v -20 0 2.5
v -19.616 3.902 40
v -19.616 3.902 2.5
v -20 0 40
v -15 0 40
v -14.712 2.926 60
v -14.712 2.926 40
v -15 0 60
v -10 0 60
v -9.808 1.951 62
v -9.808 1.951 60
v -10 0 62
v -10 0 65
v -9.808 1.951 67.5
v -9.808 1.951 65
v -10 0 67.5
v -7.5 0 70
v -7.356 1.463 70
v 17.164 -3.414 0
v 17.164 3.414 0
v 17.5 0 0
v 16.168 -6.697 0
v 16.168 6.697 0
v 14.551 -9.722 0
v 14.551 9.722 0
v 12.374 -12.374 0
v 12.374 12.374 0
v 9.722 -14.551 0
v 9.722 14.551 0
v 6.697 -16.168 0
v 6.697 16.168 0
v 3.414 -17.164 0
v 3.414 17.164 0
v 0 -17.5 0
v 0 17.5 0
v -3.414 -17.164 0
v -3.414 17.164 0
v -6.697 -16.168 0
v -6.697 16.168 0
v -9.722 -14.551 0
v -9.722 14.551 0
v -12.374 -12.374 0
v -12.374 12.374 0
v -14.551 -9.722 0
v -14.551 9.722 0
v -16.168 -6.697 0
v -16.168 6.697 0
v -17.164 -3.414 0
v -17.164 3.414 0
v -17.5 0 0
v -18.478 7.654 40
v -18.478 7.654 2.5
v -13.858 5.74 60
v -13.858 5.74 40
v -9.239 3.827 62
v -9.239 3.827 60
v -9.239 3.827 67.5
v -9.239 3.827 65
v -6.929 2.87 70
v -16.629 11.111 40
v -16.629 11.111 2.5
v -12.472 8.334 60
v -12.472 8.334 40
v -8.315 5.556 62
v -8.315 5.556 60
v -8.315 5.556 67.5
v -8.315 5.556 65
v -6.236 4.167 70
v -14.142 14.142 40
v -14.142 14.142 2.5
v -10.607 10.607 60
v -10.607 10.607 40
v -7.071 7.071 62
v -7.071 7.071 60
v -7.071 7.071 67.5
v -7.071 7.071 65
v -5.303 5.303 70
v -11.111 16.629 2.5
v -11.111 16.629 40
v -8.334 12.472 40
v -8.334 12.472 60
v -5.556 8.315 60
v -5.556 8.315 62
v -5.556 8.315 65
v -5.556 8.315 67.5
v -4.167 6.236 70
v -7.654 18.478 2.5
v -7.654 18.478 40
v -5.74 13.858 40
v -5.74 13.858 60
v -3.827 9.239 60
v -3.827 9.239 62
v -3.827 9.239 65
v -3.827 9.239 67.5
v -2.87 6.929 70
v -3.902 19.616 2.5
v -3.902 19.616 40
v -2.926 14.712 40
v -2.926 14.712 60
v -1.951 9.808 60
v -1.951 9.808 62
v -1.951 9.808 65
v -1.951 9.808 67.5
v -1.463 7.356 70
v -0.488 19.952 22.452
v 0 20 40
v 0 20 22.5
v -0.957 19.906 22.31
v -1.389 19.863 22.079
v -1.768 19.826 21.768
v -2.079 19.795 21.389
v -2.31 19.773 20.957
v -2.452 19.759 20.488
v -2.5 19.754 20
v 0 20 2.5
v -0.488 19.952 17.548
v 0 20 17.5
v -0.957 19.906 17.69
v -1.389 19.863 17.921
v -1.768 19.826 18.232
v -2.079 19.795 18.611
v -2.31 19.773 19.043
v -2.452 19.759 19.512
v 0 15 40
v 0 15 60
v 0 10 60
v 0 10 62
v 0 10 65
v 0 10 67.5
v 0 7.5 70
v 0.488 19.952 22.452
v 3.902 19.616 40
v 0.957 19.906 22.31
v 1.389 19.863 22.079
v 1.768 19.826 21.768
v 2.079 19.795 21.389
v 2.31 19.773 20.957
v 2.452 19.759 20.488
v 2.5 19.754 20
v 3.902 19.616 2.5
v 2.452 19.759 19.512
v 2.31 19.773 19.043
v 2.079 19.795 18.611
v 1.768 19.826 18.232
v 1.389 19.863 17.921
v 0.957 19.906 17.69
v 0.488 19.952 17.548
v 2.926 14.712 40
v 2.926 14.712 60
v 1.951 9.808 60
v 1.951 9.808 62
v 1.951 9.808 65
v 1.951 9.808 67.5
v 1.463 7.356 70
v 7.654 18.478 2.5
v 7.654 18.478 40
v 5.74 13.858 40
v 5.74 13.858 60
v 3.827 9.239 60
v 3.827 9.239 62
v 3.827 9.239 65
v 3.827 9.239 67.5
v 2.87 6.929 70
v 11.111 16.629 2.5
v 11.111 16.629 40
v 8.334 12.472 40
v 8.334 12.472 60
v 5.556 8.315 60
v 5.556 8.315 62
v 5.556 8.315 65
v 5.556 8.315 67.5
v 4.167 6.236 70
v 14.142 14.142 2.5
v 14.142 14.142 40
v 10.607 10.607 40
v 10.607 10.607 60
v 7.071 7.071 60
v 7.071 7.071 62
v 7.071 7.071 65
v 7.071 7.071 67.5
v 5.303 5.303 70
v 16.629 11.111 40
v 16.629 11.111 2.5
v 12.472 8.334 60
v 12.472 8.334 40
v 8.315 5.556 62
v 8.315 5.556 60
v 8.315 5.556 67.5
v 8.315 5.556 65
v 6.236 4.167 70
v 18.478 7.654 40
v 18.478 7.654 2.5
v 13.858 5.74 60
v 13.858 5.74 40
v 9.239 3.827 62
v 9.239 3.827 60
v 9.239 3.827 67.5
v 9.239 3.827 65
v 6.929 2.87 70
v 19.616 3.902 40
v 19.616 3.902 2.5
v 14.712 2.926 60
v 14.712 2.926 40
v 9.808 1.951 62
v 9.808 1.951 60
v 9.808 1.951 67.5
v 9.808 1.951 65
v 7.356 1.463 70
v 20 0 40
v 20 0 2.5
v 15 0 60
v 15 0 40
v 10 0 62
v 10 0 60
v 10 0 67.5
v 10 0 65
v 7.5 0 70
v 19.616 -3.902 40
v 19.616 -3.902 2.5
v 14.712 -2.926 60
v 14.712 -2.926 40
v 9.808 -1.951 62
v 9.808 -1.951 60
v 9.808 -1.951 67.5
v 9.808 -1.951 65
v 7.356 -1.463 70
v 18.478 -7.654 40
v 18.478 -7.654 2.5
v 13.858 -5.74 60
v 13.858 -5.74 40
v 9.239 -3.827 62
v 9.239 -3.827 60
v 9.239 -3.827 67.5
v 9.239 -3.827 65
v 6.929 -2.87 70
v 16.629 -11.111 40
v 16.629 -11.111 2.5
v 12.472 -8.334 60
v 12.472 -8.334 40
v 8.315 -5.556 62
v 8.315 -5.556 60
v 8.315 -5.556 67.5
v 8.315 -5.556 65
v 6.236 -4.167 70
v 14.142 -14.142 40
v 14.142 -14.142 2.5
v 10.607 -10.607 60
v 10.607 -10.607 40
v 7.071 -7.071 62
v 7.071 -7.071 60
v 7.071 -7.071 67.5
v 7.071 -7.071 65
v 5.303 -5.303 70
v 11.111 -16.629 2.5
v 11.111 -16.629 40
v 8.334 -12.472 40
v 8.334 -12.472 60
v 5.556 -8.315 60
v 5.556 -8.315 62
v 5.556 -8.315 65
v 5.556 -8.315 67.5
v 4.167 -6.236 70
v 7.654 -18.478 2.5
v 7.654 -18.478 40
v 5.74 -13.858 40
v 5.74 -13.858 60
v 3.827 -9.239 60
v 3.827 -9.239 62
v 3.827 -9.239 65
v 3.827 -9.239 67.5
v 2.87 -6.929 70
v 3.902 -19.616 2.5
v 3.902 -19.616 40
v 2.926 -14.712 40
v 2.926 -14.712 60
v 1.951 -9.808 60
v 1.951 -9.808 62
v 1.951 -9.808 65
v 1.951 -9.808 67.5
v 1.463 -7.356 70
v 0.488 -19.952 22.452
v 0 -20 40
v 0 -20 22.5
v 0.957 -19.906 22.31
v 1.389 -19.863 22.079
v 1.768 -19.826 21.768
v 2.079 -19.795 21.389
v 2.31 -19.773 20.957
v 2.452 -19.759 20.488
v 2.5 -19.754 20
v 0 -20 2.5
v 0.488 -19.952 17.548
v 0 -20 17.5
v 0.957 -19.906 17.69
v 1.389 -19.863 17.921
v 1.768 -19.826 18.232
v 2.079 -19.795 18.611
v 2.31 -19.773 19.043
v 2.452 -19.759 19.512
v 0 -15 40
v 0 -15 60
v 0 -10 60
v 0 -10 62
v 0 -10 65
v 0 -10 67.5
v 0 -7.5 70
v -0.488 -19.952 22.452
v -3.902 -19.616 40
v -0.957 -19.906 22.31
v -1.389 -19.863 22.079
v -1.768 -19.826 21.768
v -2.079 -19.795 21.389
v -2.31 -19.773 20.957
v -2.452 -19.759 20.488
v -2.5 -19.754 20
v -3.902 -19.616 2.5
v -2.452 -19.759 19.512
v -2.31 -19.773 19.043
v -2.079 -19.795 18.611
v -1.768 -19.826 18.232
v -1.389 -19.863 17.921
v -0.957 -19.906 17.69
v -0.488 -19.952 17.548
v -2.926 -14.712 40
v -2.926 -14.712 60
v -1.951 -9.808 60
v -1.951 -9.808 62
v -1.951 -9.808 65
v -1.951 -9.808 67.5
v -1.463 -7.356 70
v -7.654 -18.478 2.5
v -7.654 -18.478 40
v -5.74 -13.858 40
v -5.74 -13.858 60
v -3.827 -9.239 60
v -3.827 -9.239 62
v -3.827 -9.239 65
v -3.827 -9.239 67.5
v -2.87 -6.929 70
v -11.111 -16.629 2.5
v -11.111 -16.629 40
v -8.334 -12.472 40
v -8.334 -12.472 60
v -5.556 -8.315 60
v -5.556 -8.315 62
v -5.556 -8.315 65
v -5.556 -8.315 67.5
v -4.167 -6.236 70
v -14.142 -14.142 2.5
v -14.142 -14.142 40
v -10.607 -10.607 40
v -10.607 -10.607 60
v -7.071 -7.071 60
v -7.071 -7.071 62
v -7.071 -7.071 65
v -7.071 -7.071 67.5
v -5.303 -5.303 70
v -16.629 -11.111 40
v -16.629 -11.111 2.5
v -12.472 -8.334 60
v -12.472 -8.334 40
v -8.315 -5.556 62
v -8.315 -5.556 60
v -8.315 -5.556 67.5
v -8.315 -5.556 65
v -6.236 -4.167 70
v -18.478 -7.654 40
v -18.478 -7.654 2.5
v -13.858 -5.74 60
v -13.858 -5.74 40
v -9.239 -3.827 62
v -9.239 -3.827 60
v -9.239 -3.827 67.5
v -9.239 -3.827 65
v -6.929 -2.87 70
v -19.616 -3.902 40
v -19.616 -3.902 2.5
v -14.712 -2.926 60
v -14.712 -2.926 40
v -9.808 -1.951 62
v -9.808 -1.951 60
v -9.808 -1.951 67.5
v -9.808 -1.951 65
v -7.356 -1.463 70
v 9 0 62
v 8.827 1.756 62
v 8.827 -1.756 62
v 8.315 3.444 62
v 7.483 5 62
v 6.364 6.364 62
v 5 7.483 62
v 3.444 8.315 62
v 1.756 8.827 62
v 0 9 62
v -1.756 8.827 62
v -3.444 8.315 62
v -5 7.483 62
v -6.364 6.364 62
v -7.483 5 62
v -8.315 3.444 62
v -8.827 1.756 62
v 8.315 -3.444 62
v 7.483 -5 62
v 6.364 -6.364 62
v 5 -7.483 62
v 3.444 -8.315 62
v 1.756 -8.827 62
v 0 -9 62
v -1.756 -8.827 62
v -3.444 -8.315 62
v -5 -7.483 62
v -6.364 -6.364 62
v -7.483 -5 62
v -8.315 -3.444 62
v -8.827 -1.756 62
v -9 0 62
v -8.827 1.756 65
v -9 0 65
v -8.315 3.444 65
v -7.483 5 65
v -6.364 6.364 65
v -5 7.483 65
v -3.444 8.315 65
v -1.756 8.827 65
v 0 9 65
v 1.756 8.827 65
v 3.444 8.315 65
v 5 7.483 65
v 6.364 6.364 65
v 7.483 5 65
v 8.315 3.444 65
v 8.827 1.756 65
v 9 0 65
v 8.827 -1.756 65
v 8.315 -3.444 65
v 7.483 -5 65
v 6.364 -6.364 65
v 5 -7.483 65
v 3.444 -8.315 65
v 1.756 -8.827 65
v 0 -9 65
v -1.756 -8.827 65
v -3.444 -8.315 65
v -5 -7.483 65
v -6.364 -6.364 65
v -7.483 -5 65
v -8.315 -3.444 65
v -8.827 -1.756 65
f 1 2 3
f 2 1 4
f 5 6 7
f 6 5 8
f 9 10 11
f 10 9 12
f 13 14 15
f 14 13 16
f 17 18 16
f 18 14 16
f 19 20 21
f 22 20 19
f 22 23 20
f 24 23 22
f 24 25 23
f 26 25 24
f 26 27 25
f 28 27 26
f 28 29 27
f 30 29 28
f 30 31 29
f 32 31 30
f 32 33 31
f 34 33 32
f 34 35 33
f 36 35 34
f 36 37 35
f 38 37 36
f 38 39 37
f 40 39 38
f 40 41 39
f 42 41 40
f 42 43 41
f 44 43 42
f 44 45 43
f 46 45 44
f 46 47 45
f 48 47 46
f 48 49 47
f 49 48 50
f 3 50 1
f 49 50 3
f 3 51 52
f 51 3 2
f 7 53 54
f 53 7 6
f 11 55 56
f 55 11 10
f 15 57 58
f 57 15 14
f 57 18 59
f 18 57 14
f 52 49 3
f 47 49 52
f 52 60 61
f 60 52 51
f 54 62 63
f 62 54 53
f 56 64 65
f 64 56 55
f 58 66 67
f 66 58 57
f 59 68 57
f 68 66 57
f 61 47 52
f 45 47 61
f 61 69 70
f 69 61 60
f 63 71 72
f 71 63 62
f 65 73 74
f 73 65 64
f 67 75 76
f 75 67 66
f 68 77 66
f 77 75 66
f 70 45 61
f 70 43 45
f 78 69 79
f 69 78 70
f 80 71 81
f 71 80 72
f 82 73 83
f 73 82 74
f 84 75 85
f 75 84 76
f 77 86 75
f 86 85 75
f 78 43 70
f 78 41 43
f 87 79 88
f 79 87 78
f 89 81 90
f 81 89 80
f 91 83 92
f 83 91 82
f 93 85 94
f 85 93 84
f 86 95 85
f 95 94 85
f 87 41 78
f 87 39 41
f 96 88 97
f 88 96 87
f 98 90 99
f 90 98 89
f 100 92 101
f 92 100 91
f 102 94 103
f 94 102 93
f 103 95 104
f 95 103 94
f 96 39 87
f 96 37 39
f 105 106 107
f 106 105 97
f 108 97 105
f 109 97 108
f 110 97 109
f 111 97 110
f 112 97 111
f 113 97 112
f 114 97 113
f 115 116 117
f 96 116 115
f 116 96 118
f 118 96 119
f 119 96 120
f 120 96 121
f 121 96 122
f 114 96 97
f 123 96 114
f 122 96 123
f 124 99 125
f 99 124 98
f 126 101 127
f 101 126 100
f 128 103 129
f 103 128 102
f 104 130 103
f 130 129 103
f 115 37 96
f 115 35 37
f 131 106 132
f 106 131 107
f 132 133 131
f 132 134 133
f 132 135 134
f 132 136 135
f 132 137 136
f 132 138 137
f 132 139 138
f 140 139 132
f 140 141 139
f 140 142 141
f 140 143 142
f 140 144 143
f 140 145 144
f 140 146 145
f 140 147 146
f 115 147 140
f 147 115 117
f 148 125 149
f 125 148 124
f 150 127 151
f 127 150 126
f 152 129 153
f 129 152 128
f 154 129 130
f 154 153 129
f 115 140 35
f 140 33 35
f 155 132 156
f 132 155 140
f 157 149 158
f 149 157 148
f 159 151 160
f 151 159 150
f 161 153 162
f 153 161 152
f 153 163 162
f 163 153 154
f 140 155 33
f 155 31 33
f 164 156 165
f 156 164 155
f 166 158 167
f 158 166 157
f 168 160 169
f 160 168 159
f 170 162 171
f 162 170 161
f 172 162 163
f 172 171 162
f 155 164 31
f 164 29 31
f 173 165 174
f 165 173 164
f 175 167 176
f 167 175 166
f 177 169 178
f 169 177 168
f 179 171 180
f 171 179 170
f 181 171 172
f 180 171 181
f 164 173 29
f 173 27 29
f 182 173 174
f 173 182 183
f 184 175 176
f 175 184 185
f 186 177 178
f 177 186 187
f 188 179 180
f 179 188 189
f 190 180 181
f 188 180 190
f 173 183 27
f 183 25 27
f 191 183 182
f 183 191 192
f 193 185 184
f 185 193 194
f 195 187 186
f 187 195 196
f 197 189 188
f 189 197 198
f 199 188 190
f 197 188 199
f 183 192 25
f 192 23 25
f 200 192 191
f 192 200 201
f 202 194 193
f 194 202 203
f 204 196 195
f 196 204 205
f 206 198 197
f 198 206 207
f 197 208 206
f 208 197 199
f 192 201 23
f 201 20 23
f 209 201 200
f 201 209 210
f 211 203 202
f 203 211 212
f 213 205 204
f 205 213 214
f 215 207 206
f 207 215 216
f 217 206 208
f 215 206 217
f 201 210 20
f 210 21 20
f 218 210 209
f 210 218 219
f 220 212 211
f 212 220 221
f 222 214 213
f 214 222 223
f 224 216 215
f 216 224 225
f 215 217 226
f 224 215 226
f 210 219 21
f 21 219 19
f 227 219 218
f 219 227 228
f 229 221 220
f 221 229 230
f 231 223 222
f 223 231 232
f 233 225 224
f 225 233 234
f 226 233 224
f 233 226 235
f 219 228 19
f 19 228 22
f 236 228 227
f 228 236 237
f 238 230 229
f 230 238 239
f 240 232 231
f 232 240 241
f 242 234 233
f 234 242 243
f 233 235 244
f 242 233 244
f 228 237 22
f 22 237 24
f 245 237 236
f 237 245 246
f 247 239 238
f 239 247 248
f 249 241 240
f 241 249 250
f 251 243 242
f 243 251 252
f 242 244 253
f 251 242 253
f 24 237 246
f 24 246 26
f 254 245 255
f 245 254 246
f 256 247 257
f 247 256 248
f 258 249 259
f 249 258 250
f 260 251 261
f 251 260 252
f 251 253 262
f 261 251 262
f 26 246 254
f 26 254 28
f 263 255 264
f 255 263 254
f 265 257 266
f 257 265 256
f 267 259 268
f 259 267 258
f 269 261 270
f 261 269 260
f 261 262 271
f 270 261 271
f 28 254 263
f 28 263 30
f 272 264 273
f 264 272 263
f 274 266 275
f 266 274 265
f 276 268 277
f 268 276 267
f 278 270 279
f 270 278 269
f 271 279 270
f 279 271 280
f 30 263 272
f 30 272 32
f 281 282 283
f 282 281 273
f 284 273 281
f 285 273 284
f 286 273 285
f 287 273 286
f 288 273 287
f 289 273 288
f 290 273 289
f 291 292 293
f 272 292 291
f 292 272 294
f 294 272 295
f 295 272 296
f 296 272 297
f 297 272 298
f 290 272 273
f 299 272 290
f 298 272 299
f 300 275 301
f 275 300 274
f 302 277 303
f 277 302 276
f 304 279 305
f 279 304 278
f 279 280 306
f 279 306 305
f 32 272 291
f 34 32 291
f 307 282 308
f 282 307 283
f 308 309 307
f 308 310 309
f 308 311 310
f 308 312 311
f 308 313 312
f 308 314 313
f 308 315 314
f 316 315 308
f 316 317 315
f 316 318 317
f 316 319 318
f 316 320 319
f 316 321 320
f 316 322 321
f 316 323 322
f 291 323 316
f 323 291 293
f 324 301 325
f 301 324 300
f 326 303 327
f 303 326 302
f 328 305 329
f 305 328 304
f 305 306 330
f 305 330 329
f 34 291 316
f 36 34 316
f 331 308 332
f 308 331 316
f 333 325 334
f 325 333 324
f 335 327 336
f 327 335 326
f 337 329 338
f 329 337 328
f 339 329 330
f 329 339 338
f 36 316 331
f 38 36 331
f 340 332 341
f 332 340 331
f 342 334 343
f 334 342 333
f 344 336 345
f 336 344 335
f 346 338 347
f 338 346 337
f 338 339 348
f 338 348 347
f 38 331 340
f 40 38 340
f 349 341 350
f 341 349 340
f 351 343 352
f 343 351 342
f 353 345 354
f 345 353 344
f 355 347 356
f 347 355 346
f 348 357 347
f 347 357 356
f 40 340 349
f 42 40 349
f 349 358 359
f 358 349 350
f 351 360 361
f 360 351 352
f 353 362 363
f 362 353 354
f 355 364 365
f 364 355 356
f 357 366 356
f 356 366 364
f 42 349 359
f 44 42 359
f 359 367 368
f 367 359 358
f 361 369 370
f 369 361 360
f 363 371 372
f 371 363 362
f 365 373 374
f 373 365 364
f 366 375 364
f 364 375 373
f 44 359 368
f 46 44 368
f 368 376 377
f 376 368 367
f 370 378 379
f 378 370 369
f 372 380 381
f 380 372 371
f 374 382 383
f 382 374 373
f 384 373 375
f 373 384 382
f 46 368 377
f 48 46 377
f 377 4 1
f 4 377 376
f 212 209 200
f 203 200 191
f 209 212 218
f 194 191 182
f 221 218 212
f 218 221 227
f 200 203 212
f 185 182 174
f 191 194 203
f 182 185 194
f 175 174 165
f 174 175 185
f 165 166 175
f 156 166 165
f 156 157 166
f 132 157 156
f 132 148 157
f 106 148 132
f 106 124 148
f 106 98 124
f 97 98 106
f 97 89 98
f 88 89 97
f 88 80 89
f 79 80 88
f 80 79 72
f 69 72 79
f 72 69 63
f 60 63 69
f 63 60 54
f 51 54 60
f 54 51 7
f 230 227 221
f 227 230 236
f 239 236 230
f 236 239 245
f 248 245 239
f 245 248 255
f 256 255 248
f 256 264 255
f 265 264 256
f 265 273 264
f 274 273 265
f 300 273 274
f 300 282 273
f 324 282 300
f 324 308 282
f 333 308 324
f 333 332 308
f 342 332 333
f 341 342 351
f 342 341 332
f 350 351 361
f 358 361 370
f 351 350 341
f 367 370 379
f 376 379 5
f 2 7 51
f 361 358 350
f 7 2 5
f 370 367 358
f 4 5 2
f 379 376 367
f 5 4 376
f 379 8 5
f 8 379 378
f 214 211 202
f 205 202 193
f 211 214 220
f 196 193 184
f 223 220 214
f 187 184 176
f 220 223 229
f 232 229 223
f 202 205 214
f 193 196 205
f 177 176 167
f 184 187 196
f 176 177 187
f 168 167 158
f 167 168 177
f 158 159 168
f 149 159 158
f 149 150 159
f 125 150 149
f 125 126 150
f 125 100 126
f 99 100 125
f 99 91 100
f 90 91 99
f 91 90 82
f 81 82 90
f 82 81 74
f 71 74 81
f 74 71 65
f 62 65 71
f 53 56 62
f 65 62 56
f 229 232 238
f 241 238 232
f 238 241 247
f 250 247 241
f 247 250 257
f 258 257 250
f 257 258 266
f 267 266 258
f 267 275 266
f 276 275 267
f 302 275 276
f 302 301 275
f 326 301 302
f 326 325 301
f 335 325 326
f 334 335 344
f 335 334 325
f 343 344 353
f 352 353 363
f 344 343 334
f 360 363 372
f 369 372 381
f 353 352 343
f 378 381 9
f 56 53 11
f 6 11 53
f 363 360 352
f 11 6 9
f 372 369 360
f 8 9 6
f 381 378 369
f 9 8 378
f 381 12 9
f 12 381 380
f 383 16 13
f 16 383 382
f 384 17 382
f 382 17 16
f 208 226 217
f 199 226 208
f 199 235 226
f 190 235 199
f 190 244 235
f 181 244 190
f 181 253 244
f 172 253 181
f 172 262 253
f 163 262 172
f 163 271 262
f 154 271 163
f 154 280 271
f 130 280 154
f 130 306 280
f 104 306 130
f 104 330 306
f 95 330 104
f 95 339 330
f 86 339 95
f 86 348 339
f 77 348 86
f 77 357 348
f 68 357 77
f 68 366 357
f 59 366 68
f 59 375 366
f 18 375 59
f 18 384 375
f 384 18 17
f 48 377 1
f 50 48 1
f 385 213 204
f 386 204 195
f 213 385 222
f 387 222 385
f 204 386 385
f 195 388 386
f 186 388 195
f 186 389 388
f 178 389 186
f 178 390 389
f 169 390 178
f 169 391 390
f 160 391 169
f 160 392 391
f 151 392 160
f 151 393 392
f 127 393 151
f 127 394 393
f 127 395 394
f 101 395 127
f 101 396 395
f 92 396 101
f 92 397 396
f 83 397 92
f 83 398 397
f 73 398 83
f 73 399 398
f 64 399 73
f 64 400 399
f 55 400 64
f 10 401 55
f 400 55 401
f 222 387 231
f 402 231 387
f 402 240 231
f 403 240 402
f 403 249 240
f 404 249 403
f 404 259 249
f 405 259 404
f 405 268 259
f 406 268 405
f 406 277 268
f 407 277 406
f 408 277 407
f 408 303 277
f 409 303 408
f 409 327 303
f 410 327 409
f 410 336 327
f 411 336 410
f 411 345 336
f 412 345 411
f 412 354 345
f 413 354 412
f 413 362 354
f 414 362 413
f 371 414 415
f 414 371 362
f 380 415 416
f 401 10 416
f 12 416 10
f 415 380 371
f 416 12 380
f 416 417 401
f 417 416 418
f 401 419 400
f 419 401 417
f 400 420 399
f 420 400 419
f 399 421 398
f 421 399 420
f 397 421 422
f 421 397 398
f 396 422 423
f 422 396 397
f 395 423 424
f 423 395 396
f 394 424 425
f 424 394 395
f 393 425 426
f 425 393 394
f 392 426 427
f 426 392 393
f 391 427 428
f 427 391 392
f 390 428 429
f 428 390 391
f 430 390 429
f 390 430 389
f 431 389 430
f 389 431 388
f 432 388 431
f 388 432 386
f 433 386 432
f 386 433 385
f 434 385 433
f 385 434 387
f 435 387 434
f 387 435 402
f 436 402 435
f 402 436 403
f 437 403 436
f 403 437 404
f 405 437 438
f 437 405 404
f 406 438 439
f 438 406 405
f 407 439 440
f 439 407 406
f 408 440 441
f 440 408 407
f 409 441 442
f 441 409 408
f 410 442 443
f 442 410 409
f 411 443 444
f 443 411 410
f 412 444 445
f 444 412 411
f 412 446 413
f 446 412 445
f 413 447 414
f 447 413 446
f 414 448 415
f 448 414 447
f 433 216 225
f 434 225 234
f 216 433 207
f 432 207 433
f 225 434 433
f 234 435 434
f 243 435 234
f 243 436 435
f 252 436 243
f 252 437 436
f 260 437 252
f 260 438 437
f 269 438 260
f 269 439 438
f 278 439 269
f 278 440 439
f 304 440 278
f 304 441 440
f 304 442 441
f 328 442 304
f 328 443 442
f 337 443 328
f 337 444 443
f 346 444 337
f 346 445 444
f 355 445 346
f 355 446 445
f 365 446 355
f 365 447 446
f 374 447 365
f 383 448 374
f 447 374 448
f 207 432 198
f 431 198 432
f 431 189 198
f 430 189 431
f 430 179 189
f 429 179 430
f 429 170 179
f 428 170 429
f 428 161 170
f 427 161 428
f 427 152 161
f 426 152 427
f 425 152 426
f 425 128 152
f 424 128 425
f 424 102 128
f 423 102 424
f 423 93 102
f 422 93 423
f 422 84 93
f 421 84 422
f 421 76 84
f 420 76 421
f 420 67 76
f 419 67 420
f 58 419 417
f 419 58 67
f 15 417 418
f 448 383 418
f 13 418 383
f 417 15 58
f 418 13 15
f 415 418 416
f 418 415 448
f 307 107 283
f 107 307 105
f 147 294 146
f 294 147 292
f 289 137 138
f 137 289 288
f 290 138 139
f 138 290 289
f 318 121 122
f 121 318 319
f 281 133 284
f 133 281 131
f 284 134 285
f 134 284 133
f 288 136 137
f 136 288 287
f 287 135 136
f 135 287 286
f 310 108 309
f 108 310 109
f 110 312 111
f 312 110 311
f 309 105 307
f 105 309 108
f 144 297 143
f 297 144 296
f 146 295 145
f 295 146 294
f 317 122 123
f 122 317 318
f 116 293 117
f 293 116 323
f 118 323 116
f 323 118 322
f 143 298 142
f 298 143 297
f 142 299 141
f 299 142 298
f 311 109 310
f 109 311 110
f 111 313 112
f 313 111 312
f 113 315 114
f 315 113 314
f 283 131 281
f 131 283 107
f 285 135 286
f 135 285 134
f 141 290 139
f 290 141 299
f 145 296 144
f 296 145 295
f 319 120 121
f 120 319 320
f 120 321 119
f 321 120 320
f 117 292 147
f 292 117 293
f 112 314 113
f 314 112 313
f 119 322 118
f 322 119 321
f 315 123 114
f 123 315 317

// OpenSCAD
$fn = 32;

// ----------------------------------------------------------------------
// Stepped shaft: diameters 40, 30, 20 mm, 70 mm long
// ----------------------------------------------------------------------

// --- parameters (mm) ---
d1 = 40;                  // step 1 diameter
len1 = 40;                // step 1 length
d2 = 30;                  // step 2 diameter
len2 = 20;                // step 2 length
d3 = 20;                  // step 3 diameter
len3 = 10;                // step 3 length
total = 70;               // overall length
chamfer = 2.5;            // end chamfer
groove_r = 10;            // groove radius
groove_z = 62;            // groove position from the end
groove_w = 3;             // groove width
groove_d = 1;             // groove depth
cross_d = 5;              // cross pin hole
cross_z = 20;             // cross hole position

/* closed turning profile: x is the radius, y is the length */
profile = [[0, 0], [20 - chamfer, 0], [20, chamfer], [20, 40], [15, 40], [15, 60], [10, 60], [10, 67.5], [7.5, 70], [0, 70]];

difference() {
  rotate_extrude() polygon(profile);
  /* circlip groove just behind the shoulder */
  rotate_extrude() translate([groove_r - groove_d, groove_z]) square([groove_d + 1, groove_w]);
  /* cross pin hole through the small step */
  translate([0, 0, cross_z]) rotate([90, 0, 0]) cylinder(h = d1 + 4, d = cross_d, center = true);
}
